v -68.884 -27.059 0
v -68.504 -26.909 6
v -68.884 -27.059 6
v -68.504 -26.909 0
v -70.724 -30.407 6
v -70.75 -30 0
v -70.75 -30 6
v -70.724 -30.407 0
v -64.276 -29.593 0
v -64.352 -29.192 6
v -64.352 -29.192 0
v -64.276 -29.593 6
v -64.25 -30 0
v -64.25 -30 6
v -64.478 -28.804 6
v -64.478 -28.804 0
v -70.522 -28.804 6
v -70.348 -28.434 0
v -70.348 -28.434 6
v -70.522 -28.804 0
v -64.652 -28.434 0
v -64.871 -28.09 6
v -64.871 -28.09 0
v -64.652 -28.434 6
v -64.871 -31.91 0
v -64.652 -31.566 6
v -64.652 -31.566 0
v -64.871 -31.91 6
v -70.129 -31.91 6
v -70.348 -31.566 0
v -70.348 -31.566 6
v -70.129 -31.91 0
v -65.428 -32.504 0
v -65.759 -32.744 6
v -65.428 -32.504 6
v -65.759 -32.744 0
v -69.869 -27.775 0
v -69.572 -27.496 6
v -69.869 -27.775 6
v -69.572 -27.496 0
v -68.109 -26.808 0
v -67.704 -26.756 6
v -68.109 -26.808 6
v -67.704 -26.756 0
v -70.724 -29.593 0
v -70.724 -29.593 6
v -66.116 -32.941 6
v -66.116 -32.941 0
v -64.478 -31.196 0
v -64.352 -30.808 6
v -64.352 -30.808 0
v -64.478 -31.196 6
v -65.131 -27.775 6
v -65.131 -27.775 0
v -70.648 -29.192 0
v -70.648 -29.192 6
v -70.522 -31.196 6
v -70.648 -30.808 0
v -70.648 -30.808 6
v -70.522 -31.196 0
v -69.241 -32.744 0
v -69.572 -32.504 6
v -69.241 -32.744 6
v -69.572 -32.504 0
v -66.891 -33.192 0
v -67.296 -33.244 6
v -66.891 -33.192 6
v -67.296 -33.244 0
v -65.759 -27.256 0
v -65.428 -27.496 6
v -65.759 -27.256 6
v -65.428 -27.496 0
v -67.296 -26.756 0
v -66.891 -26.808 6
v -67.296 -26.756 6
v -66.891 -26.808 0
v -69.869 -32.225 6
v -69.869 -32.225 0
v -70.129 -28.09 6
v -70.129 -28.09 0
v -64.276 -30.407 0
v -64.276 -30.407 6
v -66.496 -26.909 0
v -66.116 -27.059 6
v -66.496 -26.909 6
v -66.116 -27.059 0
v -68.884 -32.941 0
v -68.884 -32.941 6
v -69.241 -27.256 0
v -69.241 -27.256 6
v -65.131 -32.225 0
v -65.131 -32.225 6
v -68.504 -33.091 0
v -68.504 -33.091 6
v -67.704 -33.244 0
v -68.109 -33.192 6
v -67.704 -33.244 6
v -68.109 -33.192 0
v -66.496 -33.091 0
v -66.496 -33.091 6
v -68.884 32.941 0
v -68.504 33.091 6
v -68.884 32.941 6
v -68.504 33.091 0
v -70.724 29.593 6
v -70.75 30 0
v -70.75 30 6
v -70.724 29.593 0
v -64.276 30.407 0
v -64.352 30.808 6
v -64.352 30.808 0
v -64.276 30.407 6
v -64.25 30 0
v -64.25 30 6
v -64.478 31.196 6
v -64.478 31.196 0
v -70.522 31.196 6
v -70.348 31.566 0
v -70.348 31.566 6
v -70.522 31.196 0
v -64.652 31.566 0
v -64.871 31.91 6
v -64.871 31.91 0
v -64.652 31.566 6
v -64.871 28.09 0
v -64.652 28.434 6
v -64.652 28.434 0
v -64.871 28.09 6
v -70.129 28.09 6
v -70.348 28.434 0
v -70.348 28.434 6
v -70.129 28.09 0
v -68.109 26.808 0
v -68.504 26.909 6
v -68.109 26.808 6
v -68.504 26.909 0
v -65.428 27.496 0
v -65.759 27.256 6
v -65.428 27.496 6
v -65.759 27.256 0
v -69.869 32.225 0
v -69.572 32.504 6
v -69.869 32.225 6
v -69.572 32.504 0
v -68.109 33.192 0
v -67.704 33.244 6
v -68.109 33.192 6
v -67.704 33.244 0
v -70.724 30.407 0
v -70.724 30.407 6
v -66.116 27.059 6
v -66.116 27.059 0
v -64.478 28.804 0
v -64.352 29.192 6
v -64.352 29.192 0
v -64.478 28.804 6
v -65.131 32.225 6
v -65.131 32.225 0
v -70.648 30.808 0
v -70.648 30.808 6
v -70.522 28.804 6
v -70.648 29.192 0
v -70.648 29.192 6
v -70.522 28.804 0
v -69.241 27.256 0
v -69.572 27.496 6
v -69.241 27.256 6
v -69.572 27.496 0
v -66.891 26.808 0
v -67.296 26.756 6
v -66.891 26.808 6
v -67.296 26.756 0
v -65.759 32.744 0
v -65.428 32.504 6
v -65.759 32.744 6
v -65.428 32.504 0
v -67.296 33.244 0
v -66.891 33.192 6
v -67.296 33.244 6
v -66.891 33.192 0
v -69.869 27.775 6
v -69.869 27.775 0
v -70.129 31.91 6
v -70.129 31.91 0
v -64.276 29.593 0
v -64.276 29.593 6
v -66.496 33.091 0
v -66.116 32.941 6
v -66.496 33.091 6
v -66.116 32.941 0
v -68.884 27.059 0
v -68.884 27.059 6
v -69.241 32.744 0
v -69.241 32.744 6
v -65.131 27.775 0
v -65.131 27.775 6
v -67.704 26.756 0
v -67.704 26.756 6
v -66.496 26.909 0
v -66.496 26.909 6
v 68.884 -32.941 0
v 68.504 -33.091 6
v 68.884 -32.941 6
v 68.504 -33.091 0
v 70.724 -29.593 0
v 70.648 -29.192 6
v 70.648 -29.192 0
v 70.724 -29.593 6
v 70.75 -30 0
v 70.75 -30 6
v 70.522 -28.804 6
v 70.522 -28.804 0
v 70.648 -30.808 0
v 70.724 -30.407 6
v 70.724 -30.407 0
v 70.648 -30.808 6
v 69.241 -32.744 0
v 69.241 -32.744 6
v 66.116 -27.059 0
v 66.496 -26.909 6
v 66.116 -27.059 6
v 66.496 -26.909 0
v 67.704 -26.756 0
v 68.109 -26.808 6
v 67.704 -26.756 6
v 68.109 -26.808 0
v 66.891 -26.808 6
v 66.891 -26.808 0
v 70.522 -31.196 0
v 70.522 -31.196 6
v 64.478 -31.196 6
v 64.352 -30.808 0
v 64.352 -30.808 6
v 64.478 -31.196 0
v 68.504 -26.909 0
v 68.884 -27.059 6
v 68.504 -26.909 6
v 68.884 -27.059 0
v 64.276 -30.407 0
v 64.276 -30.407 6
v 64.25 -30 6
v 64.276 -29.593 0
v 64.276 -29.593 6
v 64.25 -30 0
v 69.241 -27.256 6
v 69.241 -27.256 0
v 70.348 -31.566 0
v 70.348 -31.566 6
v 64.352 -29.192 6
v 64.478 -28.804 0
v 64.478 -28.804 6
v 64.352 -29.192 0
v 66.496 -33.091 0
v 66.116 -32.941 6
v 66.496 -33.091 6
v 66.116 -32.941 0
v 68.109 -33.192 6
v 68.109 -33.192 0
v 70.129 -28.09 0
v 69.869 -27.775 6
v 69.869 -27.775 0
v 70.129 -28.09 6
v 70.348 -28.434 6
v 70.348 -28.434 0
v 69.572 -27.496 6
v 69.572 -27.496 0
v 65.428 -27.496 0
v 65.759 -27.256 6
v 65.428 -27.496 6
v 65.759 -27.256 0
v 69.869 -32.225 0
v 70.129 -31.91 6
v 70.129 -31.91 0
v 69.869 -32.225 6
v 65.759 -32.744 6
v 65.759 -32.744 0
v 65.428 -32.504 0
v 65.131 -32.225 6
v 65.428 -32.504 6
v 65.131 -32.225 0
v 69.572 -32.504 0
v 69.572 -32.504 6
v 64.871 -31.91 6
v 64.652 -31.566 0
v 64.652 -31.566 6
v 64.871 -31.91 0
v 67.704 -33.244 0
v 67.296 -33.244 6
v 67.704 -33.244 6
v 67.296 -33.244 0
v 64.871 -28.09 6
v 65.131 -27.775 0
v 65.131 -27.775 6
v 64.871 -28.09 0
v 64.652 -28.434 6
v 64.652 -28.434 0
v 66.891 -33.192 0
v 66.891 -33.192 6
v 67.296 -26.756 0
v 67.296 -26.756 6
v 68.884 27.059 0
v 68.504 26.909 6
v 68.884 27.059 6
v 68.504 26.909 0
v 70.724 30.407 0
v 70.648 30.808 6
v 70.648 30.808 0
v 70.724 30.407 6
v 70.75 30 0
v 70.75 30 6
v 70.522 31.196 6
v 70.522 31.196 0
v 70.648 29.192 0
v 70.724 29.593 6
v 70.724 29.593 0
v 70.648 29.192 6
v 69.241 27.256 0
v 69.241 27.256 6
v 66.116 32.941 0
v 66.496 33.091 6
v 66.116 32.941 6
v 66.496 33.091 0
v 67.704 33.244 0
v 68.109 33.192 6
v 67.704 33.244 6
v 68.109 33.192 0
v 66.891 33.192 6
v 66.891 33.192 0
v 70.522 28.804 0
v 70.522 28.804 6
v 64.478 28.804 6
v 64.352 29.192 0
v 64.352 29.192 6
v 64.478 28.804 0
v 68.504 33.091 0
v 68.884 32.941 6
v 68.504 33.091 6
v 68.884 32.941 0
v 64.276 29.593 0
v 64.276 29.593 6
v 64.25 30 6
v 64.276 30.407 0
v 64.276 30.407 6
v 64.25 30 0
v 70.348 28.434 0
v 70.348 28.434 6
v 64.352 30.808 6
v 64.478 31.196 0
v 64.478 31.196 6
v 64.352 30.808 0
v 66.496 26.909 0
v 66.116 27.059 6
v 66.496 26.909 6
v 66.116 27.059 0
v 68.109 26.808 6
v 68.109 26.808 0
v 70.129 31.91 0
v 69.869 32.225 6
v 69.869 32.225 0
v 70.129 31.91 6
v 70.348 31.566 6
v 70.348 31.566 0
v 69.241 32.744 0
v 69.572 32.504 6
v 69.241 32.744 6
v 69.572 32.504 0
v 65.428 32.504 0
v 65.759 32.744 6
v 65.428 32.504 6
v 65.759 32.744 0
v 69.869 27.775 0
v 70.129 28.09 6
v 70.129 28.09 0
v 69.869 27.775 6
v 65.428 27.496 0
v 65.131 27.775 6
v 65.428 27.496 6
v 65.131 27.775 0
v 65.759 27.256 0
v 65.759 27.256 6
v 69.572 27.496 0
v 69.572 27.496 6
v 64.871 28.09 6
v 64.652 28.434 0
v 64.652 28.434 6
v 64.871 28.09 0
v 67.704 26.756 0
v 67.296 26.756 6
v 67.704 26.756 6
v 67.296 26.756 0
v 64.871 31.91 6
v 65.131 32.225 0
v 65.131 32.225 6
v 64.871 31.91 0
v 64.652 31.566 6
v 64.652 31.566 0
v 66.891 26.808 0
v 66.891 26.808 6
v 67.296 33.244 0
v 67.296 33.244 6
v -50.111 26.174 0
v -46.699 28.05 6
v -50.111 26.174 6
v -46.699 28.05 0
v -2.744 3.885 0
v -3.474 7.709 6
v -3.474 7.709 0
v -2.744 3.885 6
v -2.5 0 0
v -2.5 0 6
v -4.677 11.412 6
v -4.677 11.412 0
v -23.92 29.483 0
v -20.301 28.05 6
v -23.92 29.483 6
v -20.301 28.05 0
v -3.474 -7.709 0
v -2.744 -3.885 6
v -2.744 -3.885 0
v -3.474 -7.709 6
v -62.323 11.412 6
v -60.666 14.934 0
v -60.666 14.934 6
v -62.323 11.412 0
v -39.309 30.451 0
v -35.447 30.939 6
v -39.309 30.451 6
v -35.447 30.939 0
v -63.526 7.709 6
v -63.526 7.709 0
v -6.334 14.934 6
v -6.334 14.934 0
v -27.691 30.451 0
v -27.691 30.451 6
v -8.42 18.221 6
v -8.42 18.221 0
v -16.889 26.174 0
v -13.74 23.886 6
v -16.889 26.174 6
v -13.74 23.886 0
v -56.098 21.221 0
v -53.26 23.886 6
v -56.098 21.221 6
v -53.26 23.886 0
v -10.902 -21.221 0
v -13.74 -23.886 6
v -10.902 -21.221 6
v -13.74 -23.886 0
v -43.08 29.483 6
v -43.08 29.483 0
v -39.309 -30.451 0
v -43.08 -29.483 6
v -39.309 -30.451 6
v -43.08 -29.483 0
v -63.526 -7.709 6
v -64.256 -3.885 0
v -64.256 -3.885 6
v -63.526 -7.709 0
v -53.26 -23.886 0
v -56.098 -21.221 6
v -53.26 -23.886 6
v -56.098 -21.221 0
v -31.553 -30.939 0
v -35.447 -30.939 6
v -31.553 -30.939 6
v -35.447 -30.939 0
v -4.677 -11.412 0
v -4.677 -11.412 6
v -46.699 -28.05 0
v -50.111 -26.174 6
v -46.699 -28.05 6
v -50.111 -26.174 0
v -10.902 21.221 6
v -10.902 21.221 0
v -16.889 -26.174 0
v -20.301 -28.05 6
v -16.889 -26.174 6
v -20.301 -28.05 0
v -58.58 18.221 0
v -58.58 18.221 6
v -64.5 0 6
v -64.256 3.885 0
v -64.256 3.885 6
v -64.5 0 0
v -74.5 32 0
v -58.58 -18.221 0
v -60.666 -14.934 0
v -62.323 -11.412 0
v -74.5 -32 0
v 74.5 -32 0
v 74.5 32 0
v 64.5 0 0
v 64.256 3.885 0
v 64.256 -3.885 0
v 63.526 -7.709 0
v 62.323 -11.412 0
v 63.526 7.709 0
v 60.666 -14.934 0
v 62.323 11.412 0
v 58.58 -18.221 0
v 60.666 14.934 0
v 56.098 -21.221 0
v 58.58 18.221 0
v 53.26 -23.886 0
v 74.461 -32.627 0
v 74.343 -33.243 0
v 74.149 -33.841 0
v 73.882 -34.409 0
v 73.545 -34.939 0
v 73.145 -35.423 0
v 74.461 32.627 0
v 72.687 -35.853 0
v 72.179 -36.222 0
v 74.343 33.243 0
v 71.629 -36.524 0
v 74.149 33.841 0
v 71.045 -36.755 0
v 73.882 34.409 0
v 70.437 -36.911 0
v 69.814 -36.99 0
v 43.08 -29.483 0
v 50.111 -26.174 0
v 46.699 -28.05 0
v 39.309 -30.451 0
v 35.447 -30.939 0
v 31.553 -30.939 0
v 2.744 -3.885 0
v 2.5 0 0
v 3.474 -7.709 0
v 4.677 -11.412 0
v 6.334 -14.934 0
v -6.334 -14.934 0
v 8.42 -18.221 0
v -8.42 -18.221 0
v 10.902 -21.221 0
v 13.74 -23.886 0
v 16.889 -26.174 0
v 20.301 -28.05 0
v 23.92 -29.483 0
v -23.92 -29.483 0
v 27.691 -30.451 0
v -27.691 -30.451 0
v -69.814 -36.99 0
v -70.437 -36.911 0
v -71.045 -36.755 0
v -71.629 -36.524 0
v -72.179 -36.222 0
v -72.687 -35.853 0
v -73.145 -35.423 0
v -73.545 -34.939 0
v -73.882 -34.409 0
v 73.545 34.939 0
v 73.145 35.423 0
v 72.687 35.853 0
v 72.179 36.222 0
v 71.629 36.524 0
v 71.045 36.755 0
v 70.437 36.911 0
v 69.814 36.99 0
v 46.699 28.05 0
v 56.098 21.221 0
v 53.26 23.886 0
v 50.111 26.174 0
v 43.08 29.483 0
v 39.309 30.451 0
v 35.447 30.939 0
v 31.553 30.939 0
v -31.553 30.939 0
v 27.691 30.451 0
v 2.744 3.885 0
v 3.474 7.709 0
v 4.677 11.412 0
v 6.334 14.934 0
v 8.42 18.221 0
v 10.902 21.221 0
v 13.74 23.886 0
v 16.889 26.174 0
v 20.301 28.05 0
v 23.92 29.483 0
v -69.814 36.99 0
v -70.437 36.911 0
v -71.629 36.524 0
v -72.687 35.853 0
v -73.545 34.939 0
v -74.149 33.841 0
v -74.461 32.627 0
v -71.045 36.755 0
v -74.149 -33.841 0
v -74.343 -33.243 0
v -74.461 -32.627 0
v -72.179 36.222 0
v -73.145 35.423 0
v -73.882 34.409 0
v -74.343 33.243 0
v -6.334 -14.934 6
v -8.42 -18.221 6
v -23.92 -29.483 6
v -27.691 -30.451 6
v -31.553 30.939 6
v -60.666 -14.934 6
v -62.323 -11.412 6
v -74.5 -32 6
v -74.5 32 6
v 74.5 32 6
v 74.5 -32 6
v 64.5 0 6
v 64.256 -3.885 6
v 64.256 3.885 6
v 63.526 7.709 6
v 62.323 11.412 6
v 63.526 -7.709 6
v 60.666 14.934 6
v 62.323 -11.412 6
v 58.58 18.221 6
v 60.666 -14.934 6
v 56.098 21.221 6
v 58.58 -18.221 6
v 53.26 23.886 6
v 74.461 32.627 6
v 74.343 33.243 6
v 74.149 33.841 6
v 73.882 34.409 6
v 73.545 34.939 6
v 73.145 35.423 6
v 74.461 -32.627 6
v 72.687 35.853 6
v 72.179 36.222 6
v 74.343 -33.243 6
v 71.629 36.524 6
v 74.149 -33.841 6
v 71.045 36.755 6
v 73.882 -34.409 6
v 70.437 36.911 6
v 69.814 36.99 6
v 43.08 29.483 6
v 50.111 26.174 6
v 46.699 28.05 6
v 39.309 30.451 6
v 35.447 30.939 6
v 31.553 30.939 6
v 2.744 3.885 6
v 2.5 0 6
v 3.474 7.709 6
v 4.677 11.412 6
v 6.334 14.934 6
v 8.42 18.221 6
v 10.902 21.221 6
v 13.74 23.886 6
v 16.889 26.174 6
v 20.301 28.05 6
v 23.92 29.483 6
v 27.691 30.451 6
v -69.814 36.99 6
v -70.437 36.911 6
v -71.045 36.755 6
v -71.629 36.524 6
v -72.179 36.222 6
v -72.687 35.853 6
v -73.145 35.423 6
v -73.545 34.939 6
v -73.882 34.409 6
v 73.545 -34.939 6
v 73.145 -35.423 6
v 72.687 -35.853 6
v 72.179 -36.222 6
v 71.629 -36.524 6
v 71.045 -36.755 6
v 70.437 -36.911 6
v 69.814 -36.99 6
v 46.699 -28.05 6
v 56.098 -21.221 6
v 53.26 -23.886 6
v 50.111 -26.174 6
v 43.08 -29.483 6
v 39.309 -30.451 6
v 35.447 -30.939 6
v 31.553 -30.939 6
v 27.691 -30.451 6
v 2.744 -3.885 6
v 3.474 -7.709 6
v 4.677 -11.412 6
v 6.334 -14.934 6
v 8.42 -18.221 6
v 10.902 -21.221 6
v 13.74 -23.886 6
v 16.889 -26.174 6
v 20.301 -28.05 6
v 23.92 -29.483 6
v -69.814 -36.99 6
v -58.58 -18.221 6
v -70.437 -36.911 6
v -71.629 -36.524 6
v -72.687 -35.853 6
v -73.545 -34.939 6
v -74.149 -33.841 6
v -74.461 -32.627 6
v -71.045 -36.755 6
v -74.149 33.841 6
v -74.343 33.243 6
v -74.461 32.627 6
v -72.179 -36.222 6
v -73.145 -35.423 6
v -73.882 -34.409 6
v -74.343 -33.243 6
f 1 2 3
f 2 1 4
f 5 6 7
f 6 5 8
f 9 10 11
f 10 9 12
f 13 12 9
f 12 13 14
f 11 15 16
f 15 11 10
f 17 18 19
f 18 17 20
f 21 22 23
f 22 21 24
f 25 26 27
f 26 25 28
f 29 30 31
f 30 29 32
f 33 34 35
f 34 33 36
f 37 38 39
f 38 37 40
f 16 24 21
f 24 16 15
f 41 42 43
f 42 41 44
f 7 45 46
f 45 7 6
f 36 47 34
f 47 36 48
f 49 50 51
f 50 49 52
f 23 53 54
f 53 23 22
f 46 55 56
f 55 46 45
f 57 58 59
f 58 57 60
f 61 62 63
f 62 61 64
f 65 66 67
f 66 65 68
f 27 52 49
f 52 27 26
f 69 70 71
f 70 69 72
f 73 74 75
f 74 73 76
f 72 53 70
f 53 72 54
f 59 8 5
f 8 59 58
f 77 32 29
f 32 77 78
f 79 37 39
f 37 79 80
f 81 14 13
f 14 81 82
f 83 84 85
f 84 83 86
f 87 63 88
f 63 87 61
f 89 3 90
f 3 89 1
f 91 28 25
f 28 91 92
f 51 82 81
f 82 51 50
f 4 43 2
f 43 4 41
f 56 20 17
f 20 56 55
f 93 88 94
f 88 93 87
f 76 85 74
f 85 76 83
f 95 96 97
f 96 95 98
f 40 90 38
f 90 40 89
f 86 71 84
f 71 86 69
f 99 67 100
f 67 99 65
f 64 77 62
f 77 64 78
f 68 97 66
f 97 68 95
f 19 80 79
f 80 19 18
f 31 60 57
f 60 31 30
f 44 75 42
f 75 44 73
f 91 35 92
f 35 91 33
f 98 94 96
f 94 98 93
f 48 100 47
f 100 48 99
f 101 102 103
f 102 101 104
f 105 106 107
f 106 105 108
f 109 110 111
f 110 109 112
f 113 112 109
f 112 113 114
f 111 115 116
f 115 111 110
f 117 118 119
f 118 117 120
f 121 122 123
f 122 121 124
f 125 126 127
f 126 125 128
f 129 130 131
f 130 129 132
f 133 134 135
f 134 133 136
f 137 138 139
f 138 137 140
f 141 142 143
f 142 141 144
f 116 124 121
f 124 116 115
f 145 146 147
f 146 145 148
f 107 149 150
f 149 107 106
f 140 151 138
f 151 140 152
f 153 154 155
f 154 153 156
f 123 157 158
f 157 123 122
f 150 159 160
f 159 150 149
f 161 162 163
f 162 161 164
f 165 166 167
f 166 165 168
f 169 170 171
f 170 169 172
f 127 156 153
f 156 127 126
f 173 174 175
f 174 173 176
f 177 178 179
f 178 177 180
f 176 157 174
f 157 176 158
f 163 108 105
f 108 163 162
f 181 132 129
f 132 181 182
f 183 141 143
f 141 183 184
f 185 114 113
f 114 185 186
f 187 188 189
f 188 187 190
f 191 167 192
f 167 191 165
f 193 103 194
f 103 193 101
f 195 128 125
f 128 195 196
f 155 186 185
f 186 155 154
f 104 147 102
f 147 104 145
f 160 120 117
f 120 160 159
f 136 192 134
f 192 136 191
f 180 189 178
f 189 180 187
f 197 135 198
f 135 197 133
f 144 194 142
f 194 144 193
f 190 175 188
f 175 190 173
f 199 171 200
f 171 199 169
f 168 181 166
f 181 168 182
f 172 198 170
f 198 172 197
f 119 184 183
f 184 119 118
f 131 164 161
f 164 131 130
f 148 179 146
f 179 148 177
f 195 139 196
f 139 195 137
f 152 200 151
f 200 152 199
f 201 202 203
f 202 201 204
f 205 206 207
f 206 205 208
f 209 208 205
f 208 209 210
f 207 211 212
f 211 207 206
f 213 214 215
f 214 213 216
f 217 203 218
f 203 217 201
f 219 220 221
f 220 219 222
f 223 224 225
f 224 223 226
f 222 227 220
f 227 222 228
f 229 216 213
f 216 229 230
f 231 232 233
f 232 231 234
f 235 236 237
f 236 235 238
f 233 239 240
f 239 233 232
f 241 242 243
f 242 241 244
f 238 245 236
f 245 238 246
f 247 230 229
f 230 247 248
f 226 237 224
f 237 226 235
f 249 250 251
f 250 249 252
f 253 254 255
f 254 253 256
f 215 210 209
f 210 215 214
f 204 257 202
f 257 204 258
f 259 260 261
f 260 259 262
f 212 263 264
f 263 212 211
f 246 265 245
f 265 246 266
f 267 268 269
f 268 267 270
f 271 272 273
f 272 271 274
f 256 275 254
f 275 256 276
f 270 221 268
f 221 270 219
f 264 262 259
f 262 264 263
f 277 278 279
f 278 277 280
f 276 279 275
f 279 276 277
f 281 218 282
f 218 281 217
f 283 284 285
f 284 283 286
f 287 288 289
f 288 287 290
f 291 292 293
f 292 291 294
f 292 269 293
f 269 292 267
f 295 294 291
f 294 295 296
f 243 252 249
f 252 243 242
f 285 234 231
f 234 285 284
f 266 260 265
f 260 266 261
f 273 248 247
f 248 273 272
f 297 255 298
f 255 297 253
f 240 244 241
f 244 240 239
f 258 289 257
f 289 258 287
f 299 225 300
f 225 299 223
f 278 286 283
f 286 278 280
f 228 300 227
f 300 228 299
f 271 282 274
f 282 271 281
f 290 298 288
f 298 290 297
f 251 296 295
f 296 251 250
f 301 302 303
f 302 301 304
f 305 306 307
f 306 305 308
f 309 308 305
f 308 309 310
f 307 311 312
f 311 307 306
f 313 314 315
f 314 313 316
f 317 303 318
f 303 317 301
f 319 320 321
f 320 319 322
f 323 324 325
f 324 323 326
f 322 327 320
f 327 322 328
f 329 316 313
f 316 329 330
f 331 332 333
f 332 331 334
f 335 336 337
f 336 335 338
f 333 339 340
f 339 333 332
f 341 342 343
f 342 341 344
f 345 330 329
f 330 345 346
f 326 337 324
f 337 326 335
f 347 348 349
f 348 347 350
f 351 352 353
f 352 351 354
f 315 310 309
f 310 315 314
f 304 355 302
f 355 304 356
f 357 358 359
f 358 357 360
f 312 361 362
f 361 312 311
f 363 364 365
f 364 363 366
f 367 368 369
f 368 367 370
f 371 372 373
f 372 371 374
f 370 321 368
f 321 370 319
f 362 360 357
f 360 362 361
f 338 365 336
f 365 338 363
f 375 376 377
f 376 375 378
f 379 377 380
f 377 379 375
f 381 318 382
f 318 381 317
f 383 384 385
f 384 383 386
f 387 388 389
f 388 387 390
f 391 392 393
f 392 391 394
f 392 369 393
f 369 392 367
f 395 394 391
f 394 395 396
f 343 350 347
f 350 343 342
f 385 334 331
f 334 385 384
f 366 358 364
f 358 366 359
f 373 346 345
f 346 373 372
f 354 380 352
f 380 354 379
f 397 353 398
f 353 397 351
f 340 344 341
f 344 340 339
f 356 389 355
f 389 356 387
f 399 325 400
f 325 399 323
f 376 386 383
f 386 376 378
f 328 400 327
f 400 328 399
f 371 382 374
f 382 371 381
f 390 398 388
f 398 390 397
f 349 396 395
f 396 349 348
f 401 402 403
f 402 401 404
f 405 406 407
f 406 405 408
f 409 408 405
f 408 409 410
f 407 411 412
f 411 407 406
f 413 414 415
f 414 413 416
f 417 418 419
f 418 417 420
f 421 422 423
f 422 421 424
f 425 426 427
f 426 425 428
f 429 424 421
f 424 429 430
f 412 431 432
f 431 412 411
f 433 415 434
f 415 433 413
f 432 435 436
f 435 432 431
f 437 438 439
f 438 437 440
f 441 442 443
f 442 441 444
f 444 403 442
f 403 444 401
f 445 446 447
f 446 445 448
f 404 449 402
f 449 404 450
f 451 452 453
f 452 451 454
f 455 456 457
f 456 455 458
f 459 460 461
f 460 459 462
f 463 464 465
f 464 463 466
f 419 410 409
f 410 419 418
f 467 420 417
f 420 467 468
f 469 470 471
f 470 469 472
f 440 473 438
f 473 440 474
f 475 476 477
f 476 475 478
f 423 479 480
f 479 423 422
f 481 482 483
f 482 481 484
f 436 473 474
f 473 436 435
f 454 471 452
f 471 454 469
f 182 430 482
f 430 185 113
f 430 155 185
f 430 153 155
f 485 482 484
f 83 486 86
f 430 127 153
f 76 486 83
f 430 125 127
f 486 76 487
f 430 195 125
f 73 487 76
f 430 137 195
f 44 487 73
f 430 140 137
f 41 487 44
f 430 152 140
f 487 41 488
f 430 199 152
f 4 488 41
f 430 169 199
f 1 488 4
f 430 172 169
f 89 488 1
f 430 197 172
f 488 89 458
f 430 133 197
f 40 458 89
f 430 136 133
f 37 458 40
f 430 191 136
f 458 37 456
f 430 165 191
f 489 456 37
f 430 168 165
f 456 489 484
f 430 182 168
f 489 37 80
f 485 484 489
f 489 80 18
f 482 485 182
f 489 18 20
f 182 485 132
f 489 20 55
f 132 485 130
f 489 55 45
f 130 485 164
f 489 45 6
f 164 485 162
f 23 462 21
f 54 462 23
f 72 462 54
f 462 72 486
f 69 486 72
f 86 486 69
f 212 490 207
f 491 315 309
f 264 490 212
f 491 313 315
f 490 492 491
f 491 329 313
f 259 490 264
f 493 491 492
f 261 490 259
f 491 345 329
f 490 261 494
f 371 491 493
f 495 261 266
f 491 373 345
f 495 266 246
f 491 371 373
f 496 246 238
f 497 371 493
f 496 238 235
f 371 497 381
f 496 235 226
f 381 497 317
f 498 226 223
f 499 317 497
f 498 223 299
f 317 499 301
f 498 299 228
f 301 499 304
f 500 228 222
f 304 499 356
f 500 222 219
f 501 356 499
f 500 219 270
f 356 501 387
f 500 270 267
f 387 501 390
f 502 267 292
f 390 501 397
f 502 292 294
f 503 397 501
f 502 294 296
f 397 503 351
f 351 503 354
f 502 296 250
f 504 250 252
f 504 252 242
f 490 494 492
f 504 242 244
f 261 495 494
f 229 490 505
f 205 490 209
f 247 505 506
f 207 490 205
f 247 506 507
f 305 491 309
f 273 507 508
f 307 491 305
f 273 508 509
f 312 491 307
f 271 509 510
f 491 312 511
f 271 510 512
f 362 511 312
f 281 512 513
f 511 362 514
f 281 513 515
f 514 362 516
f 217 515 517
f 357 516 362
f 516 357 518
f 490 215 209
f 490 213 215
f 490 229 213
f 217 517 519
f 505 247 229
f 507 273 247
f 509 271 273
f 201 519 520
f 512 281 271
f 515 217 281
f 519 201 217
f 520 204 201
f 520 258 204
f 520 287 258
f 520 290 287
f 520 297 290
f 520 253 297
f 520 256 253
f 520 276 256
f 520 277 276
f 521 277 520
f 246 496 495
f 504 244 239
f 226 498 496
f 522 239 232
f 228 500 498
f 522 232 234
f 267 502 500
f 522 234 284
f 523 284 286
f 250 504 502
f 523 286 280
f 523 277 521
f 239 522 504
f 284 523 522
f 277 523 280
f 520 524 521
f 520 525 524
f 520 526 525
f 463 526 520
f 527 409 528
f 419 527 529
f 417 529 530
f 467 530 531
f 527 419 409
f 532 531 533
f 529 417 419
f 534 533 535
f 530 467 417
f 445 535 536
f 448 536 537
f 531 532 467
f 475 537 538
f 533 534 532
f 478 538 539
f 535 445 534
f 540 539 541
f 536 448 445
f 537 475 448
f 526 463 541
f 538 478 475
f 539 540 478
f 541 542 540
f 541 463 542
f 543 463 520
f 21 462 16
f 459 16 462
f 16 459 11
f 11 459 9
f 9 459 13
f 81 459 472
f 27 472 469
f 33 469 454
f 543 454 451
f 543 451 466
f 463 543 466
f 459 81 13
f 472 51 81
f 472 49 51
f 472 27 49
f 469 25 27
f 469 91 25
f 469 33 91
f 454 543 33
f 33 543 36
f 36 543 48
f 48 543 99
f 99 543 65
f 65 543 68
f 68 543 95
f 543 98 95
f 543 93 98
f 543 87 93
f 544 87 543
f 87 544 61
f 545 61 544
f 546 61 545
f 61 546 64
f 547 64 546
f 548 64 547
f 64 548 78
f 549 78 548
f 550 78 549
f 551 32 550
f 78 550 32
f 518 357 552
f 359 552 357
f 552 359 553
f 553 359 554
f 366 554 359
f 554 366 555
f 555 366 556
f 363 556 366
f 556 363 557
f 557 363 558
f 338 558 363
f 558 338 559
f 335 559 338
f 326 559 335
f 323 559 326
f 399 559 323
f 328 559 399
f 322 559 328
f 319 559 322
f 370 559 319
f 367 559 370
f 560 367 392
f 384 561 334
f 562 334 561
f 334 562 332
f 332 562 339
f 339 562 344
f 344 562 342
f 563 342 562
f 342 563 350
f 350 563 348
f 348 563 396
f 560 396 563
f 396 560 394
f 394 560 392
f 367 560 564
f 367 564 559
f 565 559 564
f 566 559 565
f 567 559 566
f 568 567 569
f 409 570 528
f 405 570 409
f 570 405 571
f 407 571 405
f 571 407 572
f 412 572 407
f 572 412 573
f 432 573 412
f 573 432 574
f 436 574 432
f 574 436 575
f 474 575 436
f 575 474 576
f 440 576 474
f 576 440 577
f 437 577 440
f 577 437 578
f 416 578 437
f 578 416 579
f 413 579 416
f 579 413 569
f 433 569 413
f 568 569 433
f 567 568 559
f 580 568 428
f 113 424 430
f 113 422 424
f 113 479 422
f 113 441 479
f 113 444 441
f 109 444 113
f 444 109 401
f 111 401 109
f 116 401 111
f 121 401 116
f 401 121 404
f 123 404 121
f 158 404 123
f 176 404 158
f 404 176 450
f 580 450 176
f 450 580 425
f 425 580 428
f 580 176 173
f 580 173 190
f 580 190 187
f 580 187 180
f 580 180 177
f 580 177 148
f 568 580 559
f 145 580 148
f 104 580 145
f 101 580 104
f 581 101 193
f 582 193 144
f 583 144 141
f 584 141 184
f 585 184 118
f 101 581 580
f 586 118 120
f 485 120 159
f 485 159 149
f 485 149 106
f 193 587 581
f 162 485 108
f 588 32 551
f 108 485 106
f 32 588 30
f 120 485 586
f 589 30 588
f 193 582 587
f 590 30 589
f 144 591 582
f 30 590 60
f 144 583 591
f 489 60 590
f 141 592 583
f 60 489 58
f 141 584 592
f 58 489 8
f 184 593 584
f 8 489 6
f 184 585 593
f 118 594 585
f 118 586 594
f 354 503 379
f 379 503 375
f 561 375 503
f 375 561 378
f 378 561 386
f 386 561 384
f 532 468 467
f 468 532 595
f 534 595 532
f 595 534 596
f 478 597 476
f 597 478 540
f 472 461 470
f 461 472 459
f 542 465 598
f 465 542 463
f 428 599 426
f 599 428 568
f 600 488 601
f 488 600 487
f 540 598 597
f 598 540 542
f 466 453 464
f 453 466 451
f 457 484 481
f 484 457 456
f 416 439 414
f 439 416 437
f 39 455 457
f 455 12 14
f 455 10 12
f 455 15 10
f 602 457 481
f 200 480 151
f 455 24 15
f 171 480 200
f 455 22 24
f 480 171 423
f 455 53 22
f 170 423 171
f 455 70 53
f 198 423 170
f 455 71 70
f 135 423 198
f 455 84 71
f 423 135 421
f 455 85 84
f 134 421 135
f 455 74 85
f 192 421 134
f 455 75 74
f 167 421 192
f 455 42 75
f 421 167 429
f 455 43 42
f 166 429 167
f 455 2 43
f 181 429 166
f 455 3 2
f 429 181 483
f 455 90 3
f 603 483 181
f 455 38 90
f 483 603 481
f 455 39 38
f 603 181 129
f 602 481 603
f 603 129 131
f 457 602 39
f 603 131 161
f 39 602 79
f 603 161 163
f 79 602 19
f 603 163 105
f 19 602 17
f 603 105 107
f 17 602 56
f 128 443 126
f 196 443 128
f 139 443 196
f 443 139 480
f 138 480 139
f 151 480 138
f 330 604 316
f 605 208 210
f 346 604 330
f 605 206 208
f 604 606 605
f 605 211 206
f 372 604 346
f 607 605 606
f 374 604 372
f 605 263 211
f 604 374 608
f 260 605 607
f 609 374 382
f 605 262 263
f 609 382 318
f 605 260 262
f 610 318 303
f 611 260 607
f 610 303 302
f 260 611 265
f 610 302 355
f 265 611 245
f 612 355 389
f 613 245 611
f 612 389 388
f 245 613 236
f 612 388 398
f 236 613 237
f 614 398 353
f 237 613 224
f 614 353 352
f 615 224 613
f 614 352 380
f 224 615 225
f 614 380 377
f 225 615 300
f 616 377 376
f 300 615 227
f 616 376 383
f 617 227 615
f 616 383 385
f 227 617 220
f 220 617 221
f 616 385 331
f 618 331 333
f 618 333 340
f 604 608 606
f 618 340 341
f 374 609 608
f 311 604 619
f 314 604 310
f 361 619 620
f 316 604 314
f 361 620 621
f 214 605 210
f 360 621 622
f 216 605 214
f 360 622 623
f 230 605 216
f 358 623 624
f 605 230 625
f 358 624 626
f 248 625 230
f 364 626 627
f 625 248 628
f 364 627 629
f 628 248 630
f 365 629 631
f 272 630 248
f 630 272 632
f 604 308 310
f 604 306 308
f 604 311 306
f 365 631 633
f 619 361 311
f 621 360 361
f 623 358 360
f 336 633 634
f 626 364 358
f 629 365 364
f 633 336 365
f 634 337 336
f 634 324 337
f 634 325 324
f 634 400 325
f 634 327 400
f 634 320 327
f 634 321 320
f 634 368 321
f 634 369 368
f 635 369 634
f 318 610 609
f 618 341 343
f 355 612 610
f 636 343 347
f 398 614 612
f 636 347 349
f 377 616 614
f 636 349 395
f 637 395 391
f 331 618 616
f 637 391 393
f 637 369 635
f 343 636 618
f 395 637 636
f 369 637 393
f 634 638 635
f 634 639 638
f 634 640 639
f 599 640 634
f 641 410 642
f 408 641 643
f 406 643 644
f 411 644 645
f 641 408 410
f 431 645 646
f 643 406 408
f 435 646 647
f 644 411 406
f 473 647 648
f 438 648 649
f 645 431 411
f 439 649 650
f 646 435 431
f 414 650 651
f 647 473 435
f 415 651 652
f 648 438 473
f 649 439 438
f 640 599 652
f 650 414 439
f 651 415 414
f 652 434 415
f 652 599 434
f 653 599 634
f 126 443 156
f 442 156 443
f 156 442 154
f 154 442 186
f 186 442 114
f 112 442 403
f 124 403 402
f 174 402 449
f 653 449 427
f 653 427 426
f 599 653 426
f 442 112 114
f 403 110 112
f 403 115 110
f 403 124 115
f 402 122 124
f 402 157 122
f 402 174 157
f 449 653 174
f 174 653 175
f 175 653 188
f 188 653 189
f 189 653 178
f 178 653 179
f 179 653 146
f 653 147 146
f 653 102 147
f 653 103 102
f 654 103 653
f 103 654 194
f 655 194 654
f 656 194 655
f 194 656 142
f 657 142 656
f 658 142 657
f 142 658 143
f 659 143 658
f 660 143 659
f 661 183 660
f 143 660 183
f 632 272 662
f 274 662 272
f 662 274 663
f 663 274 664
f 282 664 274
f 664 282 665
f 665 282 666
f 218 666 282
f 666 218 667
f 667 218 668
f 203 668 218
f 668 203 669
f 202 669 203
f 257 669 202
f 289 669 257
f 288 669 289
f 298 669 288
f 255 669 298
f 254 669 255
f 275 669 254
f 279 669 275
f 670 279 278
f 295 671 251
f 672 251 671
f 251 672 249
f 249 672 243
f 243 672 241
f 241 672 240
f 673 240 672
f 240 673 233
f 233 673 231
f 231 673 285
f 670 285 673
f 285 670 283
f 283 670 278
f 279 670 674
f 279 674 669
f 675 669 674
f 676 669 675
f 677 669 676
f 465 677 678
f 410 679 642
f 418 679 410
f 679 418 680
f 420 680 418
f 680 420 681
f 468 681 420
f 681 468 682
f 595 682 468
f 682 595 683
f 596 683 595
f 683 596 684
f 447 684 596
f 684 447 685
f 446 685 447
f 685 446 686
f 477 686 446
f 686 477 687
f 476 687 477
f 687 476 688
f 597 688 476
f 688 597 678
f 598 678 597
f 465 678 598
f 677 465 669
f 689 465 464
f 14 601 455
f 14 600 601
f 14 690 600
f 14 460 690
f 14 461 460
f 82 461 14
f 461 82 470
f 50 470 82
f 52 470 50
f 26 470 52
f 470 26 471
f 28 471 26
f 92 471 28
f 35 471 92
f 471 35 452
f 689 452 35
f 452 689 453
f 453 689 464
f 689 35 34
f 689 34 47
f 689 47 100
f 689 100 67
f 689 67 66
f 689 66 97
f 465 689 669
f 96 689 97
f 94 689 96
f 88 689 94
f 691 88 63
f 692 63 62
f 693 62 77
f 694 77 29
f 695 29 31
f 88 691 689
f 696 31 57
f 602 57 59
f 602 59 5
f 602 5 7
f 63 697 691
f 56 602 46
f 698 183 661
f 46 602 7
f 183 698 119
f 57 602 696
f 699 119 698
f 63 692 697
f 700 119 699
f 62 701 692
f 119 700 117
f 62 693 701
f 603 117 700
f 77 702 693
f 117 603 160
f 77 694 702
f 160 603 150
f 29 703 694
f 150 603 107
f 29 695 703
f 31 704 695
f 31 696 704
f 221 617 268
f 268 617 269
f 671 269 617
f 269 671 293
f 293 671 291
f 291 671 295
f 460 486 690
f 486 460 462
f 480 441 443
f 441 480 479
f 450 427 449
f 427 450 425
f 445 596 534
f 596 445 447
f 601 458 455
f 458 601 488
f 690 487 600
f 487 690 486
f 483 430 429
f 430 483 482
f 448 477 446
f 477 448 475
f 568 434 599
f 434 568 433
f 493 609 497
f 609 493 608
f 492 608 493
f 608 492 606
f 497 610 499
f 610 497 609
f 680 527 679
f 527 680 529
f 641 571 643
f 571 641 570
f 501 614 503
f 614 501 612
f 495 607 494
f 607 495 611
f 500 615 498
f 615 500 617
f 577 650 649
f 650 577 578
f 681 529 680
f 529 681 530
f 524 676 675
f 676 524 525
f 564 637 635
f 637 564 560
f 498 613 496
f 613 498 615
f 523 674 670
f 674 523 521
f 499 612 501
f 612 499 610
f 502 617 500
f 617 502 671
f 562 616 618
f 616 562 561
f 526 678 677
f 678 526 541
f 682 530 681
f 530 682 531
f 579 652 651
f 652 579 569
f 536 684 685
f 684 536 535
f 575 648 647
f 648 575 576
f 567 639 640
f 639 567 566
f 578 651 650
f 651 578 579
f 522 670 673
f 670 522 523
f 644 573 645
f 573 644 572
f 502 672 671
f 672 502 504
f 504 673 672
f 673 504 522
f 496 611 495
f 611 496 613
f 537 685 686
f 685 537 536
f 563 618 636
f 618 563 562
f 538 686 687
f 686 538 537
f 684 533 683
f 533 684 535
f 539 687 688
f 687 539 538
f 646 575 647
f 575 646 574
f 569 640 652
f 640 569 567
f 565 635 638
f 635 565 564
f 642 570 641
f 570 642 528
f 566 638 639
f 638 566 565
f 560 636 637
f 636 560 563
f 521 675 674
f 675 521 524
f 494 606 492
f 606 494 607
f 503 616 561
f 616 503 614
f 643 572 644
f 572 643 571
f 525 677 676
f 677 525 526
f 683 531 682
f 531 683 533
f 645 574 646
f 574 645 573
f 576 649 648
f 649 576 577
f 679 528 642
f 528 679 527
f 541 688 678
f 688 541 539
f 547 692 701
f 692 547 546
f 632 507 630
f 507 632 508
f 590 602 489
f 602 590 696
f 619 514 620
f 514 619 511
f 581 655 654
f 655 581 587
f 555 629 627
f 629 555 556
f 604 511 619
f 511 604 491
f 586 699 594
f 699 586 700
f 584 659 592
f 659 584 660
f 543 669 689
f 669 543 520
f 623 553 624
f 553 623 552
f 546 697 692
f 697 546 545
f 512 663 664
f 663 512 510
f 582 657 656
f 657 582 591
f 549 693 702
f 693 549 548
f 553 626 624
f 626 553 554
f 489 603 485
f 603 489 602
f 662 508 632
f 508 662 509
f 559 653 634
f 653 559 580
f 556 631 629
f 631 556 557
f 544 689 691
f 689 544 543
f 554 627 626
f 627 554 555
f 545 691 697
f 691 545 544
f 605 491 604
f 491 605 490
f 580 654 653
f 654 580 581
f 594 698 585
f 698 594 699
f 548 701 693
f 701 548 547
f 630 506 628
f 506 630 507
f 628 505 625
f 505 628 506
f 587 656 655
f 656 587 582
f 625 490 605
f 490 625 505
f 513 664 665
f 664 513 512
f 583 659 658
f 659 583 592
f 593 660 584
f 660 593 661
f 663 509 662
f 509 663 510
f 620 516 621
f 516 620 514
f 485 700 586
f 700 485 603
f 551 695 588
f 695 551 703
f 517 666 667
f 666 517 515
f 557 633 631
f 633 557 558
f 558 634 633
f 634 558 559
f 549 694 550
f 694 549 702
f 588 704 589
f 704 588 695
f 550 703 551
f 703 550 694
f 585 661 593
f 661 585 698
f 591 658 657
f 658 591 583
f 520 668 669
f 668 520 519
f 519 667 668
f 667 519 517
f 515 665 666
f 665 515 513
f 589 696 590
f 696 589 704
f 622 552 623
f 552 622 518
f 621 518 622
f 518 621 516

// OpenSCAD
$fn = 50;

difference() {
	union() {
		hull() {
			translate(v = [-69.5, 32.0, 0]) {
				cylinder(h = 6, r = 5);
			}
			translate(v = [69.5, 32.0, 0]) {
				cylinder(h = 6, r = 5);
			}
			translate(v = [-69.5, -32.0, 0]) {
				cylinder(h = 6, r = 5);
			}
			translate(v = [69.5, -32.0, 0]) {
				cylinder(h = 6, r = 5);
			}
		}
	}
	union() {
		translate(v = [-67.5, -30.0, -100.0]) {
			cylinder(h = 200, r = 3.25);
		}
		translate(v = [-67.5, 30.0, -100.0]) {
			cylinder(h = 200, r = 3.25);
		}
		translate(v = [67.5, -30.0, -100.0]) {
			cylinder(h = 200, r = 3.25);
		}
		translate(v = [67.5, 30.0, -100.0]) {
			cylinder(h = 200, r = 3.25);
		}
		translate(v = [-67.5, -30.0, -100.0]) {
			cylinder(h = 200, r = 1.8);
		}
		translate(v = [-67.5, 30.0, -100.0]) {
			cylinder(h = 200, r = 1.8);
		}
		translate(v = [67.5, -30.0, -100.0]) {
			cylinder(h = 200, r = 1.8);
		}
		translate(v = [67.5, 30.0, -100.0]) {
			cylinder(h = 200, r = 1.8);
		}
		translate(v = [-33.5, 0, 0.0]) {
			cylinder(h = 6, r = 31.0);
		}
		translate(v = [33.5, 0, 0.0]) {
			cylinder(h = 6, r = 31.0);
		}
	}
}
